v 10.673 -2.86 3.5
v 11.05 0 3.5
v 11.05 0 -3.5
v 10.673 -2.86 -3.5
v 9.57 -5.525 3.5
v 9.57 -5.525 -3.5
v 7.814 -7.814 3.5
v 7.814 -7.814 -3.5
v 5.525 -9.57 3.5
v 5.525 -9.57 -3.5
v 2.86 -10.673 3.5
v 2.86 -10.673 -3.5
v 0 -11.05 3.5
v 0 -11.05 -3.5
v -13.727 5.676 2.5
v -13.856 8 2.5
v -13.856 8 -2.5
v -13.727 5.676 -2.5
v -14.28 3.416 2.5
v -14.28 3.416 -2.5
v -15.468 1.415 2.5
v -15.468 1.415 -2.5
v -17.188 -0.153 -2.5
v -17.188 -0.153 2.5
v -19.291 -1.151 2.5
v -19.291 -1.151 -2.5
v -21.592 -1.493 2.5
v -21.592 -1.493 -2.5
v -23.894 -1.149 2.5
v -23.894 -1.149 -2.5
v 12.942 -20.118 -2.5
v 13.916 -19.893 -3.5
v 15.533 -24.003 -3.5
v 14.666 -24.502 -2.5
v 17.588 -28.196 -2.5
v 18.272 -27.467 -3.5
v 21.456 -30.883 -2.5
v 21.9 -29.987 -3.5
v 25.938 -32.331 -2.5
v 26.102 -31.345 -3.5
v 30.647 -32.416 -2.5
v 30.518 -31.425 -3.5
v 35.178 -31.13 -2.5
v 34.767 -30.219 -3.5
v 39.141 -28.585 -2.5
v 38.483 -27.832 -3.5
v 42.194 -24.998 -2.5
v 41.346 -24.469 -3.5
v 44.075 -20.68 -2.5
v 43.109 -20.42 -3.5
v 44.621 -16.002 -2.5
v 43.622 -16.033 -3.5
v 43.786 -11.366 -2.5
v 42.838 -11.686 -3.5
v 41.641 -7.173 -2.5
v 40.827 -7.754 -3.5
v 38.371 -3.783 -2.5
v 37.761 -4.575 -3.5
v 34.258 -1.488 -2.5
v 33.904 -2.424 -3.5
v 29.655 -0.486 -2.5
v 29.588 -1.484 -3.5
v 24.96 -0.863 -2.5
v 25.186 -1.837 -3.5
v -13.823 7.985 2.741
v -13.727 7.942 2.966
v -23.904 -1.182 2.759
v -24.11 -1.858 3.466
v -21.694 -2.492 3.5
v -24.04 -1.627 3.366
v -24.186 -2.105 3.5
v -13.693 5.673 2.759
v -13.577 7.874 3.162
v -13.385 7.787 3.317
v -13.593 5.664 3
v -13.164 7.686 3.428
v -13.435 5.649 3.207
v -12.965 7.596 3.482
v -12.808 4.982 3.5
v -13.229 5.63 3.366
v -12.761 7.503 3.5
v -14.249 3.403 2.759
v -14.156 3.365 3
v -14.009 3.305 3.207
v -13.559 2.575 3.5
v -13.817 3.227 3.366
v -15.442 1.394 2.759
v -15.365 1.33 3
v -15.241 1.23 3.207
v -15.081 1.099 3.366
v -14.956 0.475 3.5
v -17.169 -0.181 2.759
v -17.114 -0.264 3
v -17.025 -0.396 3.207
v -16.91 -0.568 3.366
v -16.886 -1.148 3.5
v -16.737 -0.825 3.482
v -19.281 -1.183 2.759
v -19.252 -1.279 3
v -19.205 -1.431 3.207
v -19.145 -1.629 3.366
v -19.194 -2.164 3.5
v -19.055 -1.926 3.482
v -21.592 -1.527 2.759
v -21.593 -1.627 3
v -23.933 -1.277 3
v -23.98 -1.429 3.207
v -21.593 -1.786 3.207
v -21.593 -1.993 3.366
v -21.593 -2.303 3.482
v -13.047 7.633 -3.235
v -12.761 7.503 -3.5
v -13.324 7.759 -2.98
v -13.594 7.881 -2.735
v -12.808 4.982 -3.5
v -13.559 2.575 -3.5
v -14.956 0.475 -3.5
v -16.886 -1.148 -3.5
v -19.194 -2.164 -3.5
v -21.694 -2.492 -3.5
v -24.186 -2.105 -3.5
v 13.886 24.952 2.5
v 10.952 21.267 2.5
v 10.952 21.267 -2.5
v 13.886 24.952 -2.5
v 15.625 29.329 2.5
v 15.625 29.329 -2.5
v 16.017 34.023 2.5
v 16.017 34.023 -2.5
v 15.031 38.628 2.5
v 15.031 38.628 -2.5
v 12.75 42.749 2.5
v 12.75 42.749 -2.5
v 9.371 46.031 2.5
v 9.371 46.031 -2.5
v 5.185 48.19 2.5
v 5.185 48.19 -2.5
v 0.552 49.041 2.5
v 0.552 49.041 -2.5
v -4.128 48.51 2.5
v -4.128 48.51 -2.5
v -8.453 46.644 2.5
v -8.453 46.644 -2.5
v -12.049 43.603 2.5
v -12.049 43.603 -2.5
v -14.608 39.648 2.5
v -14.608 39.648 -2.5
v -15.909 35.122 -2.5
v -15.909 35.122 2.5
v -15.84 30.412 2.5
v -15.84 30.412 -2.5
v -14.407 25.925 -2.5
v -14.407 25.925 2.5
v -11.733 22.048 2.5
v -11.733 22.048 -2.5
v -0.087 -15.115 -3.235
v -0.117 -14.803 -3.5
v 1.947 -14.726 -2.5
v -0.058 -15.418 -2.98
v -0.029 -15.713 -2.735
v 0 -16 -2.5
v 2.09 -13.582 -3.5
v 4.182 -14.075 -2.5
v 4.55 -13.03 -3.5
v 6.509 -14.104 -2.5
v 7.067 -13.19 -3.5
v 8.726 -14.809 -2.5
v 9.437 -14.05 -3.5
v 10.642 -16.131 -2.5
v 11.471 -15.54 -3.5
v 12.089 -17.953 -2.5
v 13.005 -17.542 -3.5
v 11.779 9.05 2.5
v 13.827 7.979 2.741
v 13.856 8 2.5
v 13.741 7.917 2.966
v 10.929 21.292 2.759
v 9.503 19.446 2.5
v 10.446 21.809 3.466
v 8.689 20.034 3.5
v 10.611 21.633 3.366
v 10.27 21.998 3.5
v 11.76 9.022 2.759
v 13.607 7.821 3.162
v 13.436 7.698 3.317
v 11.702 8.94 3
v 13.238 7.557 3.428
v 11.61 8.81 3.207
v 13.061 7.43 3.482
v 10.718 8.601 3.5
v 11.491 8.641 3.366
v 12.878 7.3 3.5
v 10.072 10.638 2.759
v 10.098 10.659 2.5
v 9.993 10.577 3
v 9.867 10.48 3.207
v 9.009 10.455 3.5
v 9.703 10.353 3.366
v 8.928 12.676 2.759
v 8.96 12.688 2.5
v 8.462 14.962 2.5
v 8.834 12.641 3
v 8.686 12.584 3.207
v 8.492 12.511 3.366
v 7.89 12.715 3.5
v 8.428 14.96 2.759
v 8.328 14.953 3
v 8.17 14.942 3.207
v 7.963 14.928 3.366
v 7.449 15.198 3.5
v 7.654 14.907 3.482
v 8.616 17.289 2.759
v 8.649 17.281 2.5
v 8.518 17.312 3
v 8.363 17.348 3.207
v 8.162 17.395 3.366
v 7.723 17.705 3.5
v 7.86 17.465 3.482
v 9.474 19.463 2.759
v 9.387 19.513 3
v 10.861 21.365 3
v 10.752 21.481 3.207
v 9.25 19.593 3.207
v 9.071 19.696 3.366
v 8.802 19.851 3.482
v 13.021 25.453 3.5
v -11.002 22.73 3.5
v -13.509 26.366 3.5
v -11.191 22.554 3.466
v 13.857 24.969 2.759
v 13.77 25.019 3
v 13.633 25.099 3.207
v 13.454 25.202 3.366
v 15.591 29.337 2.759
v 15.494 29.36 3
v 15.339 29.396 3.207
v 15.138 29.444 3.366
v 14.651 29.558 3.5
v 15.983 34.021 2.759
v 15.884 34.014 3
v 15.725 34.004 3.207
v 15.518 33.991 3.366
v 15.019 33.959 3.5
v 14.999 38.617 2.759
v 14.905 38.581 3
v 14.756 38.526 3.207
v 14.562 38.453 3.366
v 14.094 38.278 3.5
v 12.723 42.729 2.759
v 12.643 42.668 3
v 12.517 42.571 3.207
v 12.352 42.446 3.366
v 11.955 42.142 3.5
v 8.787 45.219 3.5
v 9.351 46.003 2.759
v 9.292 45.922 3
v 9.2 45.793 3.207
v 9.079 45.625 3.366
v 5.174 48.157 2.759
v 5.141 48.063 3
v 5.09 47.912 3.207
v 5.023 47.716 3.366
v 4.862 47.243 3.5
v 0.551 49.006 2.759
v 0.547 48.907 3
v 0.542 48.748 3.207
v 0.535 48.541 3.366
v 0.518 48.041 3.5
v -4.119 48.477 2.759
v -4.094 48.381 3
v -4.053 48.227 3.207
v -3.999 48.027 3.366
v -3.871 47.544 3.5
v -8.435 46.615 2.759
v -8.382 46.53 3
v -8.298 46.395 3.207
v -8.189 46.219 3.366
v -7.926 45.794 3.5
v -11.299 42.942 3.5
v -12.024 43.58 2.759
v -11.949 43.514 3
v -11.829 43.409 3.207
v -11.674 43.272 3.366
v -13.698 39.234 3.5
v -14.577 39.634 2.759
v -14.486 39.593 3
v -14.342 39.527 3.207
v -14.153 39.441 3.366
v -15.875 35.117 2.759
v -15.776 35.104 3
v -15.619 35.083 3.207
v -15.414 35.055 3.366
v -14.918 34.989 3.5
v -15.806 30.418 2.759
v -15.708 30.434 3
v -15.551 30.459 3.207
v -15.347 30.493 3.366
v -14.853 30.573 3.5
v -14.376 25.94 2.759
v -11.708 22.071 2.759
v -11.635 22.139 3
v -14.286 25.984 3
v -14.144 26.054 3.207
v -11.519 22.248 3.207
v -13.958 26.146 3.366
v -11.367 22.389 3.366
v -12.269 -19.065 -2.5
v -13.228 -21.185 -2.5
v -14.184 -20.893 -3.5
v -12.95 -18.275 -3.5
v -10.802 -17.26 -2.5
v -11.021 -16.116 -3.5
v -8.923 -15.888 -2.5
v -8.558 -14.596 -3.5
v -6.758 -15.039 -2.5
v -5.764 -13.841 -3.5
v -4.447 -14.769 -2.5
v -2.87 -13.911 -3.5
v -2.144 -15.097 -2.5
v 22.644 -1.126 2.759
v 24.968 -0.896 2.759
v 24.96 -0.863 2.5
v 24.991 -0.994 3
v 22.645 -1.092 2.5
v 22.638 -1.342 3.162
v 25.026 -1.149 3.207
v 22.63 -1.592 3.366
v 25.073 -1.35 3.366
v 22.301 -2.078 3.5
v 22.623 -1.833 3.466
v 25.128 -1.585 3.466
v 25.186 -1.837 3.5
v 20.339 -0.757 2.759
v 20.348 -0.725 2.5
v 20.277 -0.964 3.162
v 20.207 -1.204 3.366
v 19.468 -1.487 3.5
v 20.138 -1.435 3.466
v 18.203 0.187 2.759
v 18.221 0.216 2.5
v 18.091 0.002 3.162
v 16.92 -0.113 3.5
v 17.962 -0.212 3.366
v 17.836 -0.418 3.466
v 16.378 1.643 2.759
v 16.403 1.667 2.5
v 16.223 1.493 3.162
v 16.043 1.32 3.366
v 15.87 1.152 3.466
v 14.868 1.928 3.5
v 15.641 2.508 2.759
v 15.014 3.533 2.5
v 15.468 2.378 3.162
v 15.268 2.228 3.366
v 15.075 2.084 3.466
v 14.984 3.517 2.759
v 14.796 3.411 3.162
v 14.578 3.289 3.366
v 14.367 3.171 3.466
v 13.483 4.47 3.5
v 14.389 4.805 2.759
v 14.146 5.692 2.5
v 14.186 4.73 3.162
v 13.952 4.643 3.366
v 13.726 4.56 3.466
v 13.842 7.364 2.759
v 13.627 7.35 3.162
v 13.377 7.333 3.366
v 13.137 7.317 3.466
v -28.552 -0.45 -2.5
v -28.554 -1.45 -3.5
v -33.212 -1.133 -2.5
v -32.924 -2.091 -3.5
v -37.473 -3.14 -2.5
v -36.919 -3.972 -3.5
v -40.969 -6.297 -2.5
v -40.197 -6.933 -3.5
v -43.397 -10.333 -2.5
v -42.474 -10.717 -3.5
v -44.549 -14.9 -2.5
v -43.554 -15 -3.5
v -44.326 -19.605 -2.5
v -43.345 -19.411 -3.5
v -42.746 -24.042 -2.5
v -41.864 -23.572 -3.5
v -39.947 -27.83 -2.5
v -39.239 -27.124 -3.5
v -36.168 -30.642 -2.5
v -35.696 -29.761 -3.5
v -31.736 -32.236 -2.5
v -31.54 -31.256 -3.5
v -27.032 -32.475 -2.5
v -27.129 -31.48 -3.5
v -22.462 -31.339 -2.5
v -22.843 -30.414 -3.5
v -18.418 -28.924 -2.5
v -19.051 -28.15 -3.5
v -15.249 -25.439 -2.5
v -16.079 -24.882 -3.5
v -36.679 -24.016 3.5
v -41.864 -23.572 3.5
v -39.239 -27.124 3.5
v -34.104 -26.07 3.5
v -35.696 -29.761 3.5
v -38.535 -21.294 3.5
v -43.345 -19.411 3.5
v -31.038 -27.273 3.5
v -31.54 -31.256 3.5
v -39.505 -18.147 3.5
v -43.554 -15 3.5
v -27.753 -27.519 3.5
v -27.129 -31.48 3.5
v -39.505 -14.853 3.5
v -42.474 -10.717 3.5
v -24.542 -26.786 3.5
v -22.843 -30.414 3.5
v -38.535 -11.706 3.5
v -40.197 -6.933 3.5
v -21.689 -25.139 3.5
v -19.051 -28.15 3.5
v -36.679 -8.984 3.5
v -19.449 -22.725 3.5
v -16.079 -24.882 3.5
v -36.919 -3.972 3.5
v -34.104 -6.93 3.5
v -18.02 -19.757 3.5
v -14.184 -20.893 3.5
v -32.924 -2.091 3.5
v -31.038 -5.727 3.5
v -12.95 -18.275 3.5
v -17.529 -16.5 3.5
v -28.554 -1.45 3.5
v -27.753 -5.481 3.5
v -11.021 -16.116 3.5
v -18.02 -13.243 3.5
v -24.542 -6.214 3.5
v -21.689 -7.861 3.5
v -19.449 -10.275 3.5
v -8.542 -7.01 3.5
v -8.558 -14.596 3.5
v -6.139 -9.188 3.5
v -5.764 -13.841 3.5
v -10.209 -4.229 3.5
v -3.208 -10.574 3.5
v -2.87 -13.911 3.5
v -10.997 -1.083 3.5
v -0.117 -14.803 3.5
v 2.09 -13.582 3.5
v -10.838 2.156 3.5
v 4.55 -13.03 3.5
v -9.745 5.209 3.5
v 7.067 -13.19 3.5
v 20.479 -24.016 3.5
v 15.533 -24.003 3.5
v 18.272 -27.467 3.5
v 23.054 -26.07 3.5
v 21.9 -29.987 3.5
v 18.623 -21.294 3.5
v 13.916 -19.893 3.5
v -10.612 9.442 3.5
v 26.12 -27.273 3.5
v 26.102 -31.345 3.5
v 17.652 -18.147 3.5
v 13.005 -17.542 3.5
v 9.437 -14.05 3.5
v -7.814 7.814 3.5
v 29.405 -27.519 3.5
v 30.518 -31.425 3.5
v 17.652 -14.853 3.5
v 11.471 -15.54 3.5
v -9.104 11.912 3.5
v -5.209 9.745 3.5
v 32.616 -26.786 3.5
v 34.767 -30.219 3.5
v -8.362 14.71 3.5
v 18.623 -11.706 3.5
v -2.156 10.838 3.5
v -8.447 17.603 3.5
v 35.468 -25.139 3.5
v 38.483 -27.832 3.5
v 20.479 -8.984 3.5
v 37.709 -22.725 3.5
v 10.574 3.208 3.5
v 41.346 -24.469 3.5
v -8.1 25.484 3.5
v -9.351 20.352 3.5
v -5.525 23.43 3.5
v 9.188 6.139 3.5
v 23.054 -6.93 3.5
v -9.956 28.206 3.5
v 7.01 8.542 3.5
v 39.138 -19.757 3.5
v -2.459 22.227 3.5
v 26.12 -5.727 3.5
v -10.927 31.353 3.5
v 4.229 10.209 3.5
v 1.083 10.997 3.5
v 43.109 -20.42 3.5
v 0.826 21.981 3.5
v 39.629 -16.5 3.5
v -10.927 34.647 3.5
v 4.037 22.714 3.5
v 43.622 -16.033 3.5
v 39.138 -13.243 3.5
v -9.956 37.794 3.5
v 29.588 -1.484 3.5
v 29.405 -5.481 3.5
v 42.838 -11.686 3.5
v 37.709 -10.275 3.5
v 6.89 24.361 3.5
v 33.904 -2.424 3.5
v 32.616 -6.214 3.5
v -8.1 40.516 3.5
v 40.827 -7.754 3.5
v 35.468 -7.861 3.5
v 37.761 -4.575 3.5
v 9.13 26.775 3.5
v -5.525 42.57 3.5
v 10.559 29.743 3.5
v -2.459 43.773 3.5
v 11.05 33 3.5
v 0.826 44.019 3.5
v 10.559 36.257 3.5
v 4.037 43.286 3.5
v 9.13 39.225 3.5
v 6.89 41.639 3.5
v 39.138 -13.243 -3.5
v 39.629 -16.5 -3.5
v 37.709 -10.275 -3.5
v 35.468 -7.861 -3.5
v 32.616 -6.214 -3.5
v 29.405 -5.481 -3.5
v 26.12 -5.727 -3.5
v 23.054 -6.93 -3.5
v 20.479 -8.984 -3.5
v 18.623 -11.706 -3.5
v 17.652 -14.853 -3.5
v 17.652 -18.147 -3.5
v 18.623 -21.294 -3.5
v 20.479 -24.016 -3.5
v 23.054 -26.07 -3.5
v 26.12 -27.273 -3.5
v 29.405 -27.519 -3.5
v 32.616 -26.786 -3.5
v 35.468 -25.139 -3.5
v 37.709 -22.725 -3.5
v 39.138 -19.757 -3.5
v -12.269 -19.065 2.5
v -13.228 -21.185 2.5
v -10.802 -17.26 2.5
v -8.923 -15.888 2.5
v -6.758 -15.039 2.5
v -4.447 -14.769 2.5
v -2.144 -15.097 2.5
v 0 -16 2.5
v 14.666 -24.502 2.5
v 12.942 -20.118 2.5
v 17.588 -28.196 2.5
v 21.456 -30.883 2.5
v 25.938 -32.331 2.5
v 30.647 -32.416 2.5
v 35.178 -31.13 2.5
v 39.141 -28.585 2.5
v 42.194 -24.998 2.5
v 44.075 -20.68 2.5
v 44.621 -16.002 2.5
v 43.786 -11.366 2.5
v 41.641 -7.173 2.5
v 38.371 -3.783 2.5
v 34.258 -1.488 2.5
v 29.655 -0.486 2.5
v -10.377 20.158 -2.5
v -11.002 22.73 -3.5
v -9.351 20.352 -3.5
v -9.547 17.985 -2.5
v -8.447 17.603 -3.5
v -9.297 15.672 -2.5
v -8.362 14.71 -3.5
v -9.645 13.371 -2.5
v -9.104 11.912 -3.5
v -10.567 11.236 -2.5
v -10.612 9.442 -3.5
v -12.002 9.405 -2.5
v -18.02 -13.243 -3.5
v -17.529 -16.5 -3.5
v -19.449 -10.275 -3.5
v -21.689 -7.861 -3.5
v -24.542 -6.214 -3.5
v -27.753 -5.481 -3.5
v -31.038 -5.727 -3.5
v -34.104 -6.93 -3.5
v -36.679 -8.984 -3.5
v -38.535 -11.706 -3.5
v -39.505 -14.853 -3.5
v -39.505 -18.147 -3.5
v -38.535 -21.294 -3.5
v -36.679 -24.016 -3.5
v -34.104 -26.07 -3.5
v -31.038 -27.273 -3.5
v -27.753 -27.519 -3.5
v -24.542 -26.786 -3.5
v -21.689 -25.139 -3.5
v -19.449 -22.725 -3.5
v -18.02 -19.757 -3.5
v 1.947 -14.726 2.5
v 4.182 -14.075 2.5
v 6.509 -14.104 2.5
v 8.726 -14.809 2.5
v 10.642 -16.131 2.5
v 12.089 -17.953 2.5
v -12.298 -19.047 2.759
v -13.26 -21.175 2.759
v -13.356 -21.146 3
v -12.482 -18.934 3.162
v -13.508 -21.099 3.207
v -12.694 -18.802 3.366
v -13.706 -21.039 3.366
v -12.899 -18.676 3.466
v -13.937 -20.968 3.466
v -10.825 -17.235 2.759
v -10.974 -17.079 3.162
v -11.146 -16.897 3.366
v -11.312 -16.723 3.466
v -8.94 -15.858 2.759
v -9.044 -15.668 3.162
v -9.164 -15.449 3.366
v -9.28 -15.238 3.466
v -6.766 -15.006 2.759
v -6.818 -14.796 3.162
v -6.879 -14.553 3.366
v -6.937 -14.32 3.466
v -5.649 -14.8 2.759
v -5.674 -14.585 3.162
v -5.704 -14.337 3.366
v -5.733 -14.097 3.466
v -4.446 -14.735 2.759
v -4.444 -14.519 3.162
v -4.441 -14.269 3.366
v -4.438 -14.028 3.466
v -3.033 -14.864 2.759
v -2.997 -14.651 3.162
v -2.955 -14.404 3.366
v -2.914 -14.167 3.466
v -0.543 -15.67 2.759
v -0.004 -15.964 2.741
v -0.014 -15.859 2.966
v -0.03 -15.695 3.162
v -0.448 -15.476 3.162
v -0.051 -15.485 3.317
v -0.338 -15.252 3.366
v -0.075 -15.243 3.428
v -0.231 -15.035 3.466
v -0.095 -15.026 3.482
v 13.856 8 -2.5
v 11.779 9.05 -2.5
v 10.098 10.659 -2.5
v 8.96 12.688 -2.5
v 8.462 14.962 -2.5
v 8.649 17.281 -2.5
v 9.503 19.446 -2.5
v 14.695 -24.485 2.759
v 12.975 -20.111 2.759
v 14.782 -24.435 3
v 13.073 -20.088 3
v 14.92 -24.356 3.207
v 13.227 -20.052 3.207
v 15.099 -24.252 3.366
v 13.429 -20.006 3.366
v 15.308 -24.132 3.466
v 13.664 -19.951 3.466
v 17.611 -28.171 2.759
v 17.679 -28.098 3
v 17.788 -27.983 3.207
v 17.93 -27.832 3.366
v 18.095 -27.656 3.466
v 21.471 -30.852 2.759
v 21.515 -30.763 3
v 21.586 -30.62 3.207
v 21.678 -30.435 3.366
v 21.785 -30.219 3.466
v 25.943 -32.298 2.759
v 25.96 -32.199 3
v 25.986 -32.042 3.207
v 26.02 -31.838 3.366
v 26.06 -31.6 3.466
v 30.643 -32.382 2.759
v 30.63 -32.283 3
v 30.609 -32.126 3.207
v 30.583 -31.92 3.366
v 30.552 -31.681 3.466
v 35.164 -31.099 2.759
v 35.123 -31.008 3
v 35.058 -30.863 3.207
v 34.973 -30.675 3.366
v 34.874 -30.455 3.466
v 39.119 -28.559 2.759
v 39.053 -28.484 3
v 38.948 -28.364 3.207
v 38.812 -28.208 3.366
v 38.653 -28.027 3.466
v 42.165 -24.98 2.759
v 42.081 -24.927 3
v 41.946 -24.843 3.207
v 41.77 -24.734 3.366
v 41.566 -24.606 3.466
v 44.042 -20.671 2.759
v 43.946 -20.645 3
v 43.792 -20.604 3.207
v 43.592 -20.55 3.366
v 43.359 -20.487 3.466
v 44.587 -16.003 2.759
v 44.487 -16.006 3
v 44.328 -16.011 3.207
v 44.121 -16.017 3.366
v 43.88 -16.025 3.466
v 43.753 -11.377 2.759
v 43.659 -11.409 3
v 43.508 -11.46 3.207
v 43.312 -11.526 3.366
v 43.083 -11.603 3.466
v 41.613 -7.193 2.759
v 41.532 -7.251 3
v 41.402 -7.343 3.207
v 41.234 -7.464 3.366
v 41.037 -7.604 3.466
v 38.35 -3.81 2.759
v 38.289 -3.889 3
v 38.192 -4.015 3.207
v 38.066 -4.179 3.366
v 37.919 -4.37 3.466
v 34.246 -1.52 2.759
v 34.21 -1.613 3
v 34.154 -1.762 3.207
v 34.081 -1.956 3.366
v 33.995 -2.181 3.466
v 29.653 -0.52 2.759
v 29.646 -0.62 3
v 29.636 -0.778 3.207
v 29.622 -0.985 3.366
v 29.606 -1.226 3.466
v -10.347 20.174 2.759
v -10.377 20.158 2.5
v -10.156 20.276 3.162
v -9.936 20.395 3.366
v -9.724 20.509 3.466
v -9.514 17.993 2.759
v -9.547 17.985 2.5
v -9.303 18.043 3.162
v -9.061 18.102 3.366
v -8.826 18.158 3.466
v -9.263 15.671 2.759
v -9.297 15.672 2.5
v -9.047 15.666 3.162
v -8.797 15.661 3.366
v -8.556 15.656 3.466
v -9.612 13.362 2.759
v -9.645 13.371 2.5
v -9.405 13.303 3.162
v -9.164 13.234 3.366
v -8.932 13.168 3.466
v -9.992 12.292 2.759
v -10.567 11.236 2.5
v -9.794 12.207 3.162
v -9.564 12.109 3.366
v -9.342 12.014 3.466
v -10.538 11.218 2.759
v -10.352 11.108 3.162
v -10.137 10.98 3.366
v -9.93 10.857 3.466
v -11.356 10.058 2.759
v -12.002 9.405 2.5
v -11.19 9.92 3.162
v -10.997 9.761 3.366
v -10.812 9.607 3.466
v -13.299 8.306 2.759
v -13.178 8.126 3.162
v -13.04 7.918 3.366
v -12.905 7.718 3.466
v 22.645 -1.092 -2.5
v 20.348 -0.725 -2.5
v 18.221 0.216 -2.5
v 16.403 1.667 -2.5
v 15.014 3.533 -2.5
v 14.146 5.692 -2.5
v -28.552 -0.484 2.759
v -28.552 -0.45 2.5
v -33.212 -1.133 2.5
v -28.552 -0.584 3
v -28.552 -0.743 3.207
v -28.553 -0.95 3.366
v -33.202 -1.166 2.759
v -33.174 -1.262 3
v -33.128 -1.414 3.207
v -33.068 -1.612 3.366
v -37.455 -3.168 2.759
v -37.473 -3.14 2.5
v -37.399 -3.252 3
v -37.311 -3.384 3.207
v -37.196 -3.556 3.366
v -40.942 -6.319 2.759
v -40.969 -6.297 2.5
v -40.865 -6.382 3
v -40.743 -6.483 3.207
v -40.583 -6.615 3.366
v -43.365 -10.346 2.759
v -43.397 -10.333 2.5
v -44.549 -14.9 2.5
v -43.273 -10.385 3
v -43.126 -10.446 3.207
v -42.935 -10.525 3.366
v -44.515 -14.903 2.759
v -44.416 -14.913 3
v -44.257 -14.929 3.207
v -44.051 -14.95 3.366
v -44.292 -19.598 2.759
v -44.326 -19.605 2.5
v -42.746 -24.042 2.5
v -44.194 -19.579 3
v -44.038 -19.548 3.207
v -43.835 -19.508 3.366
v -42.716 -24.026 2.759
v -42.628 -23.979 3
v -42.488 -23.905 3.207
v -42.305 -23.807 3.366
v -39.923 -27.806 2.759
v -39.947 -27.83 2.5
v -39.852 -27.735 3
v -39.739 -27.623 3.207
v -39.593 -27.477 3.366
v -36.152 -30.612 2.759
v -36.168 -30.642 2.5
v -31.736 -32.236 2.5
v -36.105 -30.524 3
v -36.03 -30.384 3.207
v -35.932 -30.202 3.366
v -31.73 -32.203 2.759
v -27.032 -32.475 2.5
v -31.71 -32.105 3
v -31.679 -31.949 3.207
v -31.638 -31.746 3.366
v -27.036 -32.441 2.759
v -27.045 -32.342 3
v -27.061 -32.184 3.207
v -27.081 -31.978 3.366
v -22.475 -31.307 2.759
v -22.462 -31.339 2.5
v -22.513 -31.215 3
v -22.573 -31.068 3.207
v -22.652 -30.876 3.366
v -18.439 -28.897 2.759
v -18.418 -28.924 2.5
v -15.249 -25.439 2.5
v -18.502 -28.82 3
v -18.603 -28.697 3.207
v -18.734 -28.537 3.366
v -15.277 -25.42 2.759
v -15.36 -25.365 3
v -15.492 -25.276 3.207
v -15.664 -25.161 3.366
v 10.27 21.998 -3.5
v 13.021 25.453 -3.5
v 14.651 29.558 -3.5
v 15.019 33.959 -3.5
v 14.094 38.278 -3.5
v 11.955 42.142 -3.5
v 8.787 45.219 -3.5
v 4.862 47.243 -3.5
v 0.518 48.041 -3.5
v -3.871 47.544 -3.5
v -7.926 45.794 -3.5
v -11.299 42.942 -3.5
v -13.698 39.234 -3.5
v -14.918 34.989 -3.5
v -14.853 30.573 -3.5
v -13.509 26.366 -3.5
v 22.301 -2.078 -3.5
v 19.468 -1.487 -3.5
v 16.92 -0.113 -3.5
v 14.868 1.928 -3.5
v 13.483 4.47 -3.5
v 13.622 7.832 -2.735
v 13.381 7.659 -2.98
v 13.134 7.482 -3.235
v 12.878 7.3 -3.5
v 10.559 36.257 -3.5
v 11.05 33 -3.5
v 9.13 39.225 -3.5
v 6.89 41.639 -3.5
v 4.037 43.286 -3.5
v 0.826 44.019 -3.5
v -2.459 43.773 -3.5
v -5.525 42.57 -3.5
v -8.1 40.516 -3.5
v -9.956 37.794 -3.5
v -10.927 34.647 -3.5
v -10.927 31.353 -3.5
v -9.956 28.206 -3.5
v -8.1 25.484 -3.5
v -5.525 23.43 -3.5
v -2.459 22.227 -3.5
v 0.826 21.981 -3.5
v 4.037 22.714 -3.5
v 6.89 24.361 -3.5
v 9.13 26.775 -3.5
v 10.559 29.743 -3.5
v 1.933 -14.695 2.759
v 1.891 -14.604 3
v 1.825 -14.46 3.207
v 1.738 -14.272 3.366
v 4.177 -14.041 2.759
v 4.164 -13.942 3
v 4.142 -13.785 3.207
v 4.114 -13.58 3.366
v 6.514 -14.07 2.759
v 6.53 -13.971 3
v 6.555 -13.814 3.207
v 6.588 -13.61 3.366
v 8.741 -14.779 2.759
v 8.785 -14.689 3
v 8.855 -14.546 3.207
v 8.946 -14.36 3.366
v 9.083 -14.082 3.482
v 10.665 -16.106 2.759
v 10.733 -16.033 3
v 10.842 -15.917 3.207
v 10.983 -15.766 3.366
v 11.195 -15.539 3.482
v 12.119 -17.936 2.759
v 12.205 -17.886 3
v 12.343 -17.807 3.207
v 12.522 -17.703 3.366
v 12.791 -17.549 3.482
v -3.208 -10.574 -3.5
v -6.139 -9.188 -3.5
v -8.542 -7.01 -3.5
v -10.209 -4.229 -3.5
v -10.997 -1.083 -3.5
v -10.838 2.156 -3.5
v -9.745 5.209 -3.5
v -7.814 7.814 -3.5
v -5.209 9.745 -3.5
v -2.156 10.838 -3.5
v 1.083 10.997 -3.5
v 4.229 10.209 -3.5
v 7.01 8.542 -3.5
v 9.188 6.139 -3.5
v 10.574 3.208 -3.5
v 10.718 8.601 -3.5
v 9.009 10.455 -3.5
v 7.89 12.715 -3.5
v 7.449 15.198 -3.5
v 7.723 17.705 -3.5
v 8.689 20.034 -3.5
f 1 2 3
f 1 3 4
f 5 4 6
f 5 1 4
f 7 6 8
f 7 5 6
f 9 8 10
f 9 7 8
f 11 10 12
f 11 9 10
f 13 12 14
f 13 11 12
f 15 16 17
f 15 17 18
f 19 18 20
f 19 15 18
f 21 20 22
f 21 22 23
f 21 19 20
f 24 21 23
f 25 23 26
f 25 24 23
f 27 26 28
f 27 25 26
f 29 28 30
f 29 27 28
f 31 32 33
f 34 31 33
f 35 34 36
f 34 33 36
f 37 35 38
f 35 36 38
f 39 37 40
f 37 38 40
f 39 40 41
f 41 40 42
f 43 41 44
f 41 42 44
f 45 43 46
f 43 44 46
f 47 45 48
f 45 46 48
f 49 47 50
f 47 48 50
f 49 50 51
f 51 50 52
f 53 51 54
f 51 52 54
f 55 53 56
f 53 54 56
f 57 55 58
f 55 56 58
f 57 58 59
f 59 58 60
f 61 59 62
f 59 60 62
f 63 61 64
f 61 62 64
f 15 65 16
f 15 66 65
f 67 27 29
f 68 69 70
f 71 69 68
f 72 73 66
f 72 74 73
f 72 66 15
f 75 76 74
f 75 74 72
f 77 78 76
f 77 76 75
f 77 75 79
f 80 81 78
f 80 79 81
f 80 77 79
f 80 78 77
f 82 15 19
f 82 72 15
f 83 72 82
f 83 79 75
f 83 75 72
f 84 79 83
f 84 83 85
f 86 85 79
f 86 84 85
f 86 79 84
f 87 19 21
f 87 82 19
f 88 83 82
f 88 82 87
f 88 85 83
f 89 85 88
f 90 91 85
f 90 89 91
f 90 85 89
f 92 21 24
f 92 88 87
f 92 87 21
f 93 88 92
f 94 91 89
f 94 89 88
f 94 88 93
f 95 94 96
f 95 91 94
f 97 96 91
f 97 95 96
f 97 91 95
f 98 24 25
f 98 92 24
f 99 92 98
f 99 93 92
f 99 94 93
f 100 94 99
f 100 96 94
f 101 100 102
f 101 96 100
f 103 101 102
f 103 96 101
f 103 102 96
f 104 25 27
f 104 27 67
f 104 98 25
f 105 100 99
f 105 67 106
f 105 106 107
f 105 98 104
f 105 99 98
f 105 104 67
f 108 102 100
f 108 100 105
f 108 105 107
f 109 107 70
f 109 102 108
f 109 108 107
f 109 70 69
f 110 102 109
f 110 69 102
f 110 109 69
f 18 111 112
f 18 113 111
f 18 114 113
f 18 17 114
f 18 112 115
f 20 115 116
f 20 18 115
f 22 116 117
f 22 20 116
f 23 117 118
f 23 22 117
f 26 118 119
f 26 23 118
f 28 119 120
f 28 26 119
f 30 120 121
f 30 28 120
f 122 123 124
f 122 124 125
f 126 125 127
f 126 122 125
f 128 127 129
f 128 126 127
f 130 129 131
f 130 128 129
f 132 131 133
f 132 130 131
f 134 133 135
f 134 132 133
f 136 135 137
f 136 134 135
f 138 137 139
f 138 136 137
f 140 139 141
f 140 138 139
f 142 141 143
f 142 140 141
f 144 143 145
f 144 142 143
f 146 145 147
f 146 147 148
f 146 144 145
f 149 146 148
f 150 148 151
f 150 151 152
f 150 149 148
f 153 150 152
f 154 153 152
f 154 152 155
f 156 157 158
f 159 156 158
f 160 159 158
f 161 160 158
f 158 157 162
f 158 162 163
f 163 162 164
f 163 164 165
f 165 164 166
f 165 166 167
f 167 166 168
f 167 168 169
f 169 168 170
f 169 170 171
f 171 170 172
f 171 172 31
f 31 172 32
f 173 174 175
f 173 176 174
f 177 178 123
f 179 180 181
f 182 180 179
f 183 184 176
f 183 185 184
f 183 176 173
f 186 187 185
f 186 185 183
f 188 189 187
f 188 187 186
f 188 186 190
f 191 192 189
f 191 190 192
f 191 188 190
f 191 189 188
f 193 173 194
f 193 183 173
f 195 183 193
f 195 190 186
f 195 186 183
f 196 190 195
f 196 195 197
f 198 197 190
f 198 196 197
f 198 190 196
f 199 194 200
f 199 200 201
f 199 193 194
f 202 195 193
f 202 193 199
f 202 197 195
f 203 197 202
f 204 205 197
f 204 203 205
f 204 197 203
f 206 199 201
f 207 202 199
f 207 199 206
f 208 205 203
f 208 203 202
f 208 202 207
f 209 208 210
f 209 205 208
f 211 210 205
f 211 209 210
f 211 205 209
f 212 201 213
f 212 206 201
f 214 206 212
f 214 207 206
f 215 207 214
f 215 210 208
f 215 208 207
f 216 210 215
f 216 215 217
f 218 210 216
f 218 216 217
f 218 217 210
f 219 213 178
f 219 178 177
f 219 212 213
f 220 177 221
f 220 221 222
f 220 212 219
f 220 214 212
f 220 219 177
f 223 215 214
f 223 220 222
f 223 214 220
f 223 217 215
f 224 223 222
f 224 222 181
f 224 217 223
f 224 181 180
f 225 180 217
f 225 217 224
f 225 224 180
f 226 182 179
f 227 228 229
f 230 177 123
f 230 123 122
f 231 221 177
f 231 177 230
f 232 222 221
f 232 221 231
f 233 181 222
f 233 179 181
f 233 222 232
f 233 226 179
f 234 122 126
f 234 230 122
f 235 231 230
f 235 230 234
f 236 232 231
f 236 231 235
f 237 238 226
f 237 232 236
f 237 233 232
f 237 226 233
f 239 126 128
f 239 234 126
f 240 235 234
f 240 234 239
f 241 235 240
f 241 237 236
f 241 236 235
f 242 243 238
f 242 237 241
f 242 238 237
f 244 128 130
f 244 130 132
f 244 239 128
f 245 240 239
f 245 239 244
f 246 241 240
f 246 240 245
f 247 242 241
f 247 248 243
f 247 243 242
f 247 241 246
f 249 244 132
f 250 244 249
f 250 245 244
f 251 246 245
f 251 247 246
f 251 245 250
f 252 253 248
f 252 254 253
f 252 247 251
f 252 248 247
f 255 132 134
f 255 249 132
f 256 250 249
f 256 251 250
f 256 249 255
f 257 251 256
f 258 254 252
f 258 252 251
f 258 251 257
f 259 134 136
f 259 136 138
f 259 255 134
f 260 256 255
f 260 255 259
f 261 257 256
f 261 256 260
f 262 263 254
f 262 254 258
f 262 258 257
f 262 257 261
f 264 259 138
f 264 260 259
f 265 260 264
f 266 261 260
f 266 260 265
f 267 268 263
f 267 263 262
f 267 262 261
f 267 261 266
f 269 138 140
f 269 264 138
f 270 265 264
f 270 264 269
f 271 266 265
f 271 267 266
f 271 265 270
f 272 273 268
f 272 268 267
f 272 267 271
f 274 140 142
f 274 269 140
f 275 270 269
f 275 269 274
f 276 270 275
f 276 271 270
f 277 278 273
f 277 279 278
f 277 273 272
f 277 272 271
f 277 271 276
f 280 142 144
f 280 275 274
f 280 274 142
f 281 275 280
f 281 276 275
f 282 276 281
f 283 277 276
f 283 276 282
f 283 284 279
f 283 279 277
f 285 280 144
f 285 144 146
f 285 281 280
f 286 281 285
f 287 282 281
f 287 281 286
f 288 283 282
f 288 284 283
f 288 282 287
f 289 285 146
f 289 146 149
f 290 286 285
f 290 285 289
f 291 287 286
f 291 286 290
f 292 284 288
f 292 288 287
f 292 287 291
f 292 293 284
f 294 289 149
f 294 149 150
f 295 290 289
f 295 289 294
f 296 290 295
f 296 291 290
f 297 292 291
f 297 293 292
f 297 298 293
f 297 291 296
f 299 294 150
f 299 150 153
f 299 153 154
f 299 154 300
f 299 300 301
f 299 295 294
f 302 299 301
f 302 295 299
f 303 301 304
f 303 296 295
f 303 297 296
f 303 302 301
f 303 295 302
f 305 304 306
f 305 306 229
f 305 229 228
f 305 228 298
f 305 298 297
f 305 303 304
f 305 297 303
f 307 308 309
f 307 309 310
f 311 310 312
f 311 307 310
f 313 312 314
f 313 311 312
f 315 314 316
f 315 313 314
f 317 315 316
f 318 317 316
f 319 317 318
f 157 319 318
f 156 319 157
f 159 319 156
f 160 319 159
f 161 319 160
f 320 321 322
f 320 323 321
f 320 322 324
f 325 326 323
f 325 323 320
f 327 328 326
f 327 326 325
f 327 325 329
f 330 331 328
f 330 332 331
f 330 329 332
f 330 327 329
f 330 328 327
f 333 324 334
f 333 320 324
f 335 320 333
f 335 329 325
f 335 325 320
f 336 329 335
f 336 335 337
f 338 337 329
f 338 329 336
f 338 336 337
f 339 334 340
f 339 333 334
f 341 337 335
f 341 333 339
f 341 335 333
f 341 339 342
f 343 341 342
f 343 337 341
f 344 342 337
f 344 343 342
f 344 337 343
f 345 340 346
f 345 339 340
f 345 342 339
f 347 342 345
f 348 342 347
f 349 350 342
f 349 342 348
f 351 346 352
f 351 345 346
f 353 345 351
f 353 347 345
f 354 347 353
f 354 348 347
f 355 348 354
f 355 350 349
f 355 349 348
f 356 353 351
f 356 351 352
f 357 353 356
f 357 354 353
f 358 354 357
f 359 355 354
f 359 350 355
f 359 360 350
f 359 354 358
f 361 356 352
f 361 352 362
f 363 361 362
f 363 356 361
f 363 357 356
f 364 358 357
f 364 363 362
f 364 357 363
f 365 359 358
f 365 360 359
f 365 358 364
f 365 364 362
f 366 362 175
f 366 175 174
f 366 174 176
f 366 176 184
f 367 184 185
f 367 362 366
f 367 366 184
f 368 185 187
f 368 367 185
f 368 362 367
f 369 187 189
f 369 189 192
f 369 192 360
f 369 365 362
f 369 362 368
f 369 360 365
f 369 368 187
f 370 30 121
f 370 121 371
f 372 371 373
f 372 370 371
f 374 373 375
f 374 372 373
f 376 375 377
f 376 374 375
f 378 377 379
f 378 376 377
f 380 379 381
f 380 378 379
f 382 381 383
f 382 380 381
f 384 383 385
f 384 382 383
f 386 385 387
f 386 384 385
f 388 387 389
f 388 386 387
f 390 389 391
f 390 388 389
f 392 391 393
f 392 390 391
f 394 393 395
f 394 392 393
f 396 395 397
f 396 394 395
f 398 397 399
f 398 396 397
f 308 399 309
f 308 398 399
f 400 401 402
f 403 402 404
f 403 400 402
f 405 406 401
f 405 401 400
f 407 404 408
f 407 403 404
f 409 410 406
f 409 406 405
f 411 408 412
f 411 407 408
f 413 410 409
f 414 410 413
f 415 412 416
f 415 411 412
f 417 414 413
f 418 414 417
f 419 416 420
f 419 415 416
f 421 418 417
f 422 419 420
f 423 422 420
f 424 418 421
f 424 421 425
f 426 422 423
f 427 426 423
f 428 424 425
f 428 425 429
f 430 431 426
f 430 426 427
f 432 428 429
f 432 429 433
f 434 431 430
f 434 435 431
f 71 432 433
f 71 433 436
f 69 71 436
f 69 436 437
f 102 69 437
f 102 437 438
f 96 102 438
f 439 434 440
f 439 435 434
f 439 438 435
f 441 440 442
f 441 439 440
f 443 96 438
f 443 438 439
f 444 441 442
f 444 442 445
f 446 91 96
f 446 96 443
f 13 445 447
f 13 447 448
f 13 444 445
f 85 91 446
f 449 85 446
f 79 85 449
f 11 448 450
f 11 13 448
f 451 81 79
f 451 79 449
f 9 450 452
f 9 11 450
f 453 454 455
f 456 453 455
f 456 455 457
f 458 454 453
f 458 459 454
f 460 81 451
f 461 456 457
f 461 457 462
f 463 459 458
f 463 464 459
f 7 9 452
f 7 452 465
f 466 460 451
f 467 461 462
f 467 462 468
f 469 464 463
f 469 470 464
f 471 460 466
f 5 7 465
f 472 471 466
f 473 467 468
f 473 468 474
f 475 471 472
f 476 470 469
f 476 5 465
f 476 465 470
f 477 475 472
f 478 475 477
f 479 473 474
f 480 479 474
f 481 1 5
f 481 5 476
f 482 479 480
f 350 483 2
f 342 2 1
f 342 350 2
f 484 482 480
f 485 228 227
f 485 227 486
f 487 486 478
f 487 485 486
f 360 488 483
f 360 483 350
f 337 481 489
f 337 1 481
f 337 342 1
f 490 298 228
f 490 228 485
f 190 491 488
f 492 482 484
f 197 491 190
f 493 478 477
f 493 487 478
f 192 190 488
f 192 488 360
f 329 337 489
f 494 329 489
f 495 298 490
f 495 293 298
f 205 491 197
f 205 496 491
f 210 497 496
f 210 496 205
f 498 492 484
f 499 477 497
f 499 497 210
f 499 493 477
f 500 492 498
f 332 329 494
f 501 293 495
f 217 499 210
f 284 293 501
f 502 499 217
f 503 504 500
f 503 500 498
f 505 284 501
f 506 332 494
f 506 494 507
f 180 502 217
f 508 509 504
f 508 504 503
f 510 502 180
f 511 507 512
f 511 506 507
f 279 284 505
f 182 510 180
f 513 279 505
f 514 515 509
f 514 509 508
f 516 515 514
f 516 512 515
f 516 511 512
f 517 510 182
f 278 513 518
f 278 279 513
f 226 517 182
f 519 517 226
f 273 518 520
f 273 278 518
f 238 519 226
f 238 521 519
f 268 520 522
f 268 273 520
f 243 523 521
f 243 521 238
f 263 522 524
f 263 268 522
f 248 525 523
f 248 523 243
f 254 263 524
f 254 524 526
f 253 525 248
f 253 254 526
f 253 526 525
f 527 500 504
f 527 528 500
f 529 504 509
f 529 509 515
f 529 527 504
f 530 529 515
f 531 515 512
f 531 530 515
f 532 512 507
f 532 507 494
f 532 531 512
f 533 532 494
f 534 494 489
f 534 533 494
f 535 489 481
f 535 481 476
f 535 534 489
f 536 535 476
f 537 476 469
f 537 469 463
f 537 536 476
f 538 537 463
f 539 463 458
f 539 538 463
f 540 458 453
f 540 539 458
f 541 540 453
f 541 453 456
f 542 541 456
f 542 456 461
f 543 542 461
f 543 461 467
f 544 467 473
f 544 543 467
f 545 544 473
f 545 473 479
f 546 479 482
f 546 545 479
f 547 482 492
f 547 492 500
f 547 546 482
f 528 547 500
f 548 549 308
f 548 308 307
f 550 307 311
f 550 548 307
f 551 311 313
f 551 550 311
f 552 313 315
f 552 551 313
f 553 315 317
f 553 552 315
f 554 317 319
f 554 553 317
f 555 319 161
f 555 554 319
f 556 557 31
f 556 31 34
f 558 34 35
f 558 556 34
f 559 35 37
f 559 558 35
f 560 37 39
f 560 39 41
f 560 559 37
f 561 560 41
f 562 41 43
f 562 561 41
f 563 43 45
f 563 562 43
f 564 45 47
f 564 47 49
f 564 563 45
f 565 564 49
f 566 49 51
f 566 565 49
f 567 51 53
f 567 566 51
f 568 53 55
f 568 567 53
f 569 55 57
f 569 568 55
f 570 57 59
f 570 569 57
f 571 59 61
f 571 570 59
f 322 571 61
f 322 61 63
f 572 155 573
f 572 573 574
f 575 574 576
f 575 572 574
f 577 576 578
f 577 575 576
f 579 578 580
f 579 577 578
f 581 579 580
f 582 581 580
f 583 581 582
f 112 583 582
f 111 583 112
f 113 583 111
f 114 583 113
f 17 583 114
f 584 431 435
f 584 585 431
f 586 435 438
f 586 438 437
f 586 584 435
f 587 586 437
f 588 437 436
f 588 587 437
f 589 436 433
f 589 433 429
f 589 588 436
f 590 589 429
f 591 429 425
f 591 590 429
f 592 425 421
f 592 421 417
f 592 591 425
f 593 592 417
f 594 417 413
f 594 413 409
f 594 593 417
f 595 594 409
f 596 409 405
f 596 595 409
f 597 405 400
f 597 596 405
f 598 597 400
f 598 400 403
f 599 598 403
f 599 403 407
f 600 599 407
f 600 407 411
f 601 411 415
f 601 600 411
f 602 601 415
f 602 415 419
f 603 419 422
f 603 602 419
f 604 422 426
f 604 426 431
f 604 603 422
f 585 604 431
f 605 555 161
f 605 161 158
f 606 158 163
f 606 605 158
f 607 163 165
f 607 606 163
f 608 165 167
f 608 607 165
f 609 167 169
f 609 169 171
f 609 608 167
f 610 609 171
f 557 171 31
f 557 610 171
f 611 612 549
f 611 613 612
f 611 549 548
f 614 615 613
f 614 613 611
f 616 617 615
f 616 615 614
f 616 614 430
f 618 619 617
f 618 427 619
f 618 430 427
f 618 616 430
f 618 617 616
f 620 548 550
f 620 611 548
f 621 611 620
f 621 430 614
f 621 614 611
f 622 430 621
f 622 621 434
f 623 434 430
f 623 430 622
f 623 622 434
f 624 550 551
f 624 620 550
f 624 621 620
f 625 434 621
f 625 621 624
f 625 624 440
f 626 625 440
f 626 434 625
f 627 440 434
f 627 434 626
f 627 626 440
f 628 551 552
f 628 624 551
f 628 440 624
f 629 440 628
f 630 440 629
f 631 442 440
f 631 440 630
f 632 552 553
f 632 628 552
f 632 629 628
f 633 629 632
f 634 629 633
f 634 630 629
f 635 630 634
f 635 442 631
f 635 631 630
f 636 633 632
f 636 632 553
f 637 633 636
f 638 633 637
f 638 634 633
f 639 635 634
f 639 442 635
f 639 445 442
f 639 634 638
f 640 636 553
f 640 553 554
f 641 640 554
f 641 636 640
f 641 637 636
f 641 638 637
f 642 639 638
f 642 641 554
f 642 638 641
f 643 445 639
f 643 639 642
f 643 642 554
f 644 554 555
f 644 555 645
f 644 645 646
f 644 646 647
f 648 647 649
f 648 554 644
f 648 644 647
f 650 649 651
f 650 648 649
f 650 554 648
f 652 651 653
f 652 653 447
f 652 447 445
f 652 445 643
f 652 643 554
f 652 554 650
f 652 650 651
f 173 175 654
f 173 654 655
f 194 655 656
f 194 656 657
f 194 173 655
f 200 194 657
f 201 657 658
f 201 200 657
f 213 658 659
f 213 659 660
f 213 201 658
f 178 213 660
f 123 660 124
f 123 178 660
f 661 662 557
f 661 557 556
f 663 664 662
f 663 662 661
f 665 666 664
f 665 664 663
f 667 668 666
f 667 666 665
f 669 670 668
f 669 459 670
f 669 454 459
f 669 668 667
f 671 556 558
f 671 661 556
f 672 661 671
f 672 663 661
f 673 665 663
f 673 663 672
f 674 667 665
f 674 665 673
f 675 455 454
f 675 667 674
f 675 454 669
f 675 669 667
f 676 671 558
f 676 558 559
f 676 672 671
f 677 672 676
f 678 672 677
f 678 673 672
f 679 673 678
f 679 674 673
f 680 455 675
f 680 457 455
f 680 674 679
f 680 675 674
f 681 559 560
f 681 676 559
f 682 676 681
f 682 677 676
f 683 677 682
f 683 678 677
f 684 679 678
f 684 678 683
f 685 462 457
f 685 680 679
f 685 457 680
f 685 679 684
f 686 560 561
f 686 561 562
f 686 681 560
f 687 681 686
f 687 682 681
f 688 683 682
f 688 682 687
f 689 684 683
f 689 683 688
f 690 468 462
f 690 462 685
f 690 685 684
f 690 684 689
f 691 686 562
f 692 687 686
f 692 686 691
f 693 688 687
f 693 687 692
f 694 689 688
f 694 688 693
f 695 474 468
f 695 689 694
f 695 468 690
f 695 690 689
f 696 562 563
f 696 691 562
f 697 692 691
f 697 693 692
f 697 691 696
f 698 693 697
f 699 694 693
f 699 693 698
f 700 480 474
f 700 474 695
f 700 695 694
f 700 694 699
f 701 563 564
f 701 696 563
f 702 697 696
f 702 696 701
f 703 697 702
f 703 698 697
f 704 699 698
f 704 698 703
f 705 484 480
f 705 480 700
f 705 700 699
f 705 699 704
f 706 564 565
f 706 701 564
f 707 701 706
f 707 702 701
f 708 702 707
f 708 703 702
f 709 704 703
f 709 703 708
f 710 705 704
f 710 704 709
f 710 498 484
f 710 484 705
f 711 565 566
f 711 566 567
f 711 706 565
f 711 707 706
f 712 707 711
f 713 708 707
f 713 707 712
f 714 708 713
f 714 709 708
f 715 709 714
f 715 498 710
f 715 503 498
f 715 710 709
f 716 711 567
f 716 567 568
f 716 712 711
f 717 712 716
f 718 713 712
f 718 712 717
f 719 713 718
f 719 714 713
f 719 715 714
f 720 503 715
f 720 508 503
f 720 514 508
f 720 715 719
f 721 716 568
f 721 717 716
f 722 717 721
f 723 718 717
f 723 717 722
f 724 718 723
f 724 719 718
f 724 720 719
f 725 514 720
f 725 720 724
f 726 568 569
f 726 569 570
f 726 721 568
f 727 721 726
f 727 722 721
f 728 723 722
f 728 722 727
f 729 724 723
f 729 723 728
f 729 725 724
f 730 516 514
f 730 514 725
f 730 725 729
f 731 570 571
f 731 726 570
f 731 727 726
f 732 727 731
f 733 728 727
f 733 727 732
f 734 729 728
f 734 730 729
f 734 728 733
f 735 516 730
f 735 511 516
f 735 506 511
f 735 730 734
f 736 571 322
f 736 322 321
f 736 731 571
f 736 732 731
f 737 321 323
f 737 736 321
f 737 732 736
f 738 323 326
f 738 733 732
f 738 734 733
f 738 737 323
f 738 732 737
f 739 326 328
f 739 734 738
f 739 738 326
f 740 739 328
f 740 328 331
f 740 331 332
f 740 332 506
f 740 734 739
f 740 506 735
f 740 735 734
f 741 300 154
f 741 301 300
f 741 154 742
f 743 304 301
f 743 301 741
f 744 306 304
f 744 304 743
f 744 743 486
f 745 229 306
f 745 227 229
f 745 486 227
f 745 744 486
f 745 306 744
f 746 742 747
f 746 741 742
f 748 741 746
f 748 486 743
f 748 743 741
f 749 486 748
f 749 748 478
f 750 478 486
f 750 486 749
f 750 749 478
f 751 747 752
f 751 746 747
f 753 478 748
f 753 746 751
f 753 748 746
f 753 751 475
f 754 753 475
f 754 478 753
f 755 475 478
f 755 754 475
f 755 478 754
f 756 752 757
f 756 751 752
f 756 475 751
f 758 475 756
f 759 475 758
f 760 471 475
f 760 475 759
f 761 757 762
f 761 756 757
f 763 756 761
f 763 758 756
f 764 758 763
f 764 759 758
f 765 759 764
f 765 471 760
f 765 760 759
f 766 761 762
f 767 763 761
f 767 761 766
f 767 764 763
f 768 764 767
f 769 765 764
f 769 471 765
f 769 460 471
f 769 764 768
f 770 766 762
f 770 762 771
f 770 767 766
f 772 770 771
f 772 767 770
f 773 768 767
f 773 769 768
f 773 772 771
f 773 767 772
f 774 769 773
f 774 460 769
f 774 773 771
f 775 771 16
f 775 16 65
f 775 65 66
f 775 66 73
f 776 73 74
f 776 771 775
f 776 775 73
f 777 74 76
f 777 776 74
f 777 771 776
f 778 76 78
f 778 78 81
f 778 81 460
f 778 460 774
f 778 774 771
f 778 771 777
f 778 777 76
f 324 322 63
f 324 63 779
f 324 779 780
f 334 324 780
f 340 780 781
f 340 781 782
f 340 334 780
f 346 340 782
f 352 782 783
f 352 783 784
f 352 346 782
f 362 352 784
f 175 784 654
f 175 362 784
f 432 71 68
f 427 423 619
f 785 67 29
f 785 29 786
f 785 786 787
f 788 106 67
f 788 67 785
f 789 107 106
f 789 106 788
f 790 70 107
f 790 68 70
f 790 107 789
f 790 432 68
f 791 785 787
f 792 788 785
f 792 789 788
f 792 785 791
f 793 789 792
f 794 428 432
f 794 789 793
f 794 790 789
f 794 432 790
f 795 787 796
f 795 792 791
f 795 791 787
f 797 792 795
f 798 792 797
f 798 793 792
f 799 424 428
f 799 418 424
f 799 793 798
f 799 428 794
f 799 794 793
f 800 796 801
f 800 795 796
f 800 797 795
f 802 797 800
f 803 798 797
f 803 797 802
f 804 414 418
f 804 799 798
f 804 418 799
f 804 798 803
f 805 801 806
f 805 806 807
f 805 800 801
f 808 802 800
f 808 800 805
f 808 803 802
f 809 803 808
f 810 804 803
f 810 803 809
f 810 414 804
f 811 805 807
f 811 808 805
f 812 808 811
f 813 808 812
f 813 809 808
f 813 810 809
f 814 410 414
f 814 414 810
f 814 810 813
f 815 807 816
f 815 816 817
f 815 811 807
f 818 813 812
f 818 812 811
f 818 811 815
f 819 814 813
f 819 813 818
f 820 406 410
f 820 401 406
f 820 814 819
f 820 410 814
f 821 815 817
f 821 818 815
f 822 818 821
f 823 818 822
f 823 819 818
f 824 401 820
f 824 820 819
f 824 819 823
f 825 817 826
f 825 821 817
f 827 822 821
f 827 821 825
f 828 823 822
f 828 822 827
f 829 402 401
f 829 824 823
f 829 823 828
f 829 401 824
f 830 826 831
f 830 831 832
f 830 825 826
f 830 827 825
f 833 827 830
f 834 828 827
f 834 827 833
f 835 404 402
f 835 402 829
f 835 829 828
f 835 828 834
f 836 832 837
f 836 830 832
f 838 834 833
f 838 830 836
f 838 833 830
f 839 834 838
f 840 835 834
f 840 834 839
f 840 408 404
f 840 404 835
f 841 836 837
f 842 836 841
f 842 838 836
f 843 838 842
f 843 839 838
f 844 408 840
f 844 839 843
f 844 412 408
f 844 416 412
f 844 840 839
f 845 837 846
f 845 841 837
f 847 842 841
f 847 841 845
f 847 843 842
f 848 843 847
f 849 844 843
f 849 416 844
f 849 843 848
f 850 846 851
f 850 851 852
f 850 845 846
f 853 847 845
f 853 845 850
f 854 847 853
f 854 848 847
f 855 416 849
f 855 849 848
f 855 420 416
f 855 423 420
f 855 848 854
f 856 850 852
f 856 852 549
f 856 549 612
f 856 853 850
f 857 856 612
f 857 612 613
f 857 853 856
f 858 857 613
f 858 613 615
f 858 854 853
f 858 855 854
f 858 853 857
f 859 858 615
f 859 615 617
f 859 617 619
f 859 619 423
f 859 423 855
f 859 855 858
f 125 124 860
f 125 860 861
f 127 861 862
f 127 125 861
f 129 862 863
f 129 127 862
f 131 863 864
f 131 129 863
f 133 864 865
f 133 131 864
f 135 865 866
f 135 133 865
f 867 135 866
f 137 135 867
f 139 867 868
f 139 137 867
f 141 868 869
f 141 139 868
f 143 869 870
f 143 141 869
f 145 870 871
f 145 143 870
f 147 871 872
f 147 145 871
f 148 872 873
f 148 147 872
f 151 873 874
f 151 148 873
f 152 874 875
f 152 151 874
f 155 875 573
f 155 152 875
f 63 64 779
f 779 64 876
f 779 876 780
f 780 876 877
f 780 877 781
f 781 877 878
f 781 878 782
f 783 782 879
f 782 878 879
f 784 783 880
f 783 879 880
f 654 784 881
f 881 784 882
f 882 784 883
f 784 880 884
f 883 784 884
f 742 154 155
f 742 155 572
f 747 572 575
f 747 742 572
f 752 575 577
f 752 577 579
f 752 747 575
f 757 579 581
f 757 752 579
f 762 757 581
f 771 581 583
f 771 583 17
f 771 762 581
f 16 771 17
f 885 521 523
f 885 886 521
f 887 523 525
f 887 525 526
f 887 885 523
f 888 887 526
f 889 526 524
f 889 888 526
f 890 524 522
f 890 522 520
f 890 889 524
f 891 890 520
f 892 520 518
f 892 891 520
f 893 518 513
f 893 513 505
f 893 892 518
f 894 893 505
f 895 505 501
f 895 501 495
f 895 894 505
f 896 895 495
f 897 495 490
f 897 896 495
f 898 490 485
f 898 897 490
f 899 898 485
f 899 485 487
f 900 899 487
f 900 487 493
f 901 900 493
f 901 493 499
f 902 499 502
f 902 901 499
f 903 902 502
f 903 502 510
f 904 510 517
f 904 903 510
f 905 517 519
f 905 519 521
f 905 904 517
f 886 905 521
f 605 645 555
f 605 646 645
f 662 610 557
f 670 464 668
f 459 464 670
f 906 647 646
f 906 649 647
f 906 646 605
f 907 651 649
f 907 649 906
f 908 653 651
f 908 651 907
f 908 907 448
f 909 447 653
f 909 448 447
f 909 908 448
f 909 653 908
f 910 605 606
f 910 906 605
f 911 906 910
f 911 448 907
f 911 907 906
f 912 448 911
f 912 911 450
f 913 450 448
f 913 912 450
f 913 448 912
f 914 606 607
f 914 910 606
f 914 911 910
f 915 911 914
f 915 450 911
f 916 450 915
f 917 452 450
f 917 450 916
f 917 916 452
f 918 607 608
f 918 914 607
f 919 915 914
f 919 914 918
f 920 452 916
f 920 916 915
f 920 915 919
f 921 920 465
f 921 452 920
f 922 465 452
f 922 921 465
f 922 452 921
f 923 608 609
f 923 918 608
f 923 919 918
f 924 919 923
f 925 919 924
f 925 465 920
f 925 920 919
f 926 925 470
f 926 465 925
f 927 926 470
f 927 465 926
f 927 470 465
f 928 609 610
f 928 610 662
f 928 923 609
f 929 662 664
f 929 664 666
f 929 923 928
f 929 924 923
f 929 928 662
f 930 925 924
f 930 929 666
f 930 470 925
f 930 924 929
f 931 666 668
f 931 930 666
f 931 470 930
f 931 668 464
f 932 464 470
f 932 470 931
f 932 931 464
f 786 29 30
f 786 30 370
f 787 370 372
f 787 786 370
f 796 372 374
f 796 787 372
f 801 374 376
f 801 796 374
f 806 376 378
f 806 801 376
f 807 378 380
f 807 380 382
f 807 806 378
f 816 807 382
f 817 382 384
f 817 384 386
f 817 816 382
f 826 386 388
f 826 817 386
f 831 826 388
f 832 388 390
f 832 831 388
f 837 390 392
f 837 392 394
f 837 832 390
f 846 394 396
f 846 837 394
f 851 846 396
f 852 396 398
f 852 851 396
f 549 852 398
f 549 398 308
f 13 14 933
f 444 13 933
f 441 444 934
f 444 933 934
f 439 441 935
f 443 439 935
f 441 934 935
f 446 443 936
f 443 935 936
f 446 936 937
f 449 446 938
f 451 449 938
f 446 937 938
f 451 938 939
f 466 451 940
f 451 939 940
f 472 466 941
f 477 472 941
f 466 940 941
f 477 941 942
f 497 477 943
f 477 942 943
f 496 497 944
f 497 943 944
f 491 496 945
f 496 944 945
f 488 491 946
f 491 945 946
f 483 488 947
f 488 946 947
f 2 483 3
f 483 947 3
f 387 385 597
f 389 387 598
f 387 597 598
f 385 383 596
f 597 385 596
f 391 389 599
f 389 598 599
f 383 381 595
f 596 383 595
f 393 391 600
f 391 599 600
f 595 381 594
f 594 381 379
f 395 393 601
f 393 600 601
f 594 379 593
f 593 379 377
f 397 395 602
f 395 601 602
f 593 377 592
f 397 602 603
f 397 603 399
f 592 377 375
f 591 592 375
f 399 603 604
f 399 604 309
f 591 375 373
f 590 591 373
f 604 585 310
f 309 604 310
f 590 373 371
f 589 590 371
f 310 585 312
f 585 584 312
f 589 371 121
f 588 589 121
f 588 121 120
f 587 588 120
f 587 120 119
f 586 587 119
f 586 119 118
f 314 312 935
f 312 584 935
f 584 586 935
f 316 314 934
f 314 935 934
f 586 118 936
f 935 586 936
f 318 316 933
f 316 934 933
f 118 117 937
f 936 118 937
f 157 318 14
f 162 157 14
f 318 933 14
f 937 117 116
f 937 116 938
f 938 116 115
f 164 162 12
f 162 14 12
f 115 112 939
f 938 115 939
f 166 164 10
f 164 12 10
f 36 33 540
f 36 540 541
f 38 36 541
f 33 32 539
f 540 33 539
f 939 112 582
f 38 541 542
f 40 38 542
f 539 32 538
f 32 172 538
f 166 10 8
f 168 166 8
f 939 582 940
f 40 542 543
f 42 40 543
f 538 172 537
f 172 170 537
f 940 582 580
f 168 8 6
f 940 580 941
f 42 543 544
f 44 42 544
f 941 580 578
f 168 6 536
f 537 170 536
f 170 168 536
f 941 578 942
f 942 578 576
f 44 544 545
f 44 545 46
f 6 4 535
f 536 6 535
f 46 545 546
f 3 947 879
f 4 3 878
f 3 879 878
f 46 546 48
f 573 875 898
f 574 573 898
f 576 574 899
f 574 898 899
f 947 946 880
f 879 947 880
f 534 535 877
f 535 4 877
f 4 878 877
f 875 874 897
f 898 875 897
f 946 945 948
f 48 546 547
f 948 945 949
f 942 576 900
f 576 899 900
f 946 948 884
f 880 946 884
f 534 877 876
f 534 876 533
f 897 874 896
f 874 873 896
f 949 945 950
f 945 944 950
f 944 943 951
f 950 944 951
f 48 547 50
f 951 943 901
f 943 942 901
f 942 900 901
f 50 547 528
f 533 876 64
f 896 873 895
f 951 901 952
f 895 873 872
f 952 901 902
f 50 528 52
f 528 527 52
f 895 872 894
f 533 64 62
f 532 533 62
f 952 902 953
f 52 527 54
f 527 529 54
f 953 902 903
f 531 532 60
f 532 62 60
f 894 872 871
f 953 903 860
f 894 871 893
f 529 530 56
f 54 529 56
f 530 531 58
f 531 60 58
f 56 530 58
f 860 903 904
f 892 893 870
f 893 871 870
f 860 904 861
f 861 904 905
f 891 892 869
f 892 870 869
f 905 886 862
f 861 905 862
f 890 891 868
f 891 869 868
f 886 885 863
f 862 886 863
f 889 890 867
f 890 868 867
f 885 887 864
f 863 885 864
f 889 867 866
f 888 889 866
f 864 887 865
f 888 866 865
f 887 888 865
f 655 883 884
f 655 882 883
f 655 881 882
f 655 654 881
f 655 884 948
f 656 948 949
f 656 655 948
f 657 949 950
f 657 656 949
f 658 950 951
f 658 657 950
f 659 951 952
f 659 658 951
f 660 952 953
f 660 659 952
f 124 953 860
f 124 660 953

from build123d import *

# Parameters (mm, degrees)
F0_R     = 11.05
F1_DEPTH = 3.5
F2_R     = 1
F3_SIZE  = 1


with BuildPart() as f1:
    # F0 (on Top) → F1 (new body, symmetric)
    with BuildSketch(Plane.XY):
        with BuildLine():
            ThreePointArc((-13.227763, -21.18476), (-7.86781, -15.393259), (0, -16))
            ThreePointArc((0, -16), (7.643636, -14.374283), (12.942037, -20.118417))
            ThreePointArc((12.942037, -20.118417), (42.194334, -24.998281), (24.960422, -0.863198))
            ThreePointArc((24.960422, -0.863198), (17.264859, 0.882906), (13.856406, 8))
            ThreePointArc((13.856406, 8), (8.626677, 13.806724), (10.952041, 21.267341))
            ThreePointArc((10.952041, 21.267341), (0.55198, 49.040506), (-11.732659, 22.047959))
            ThreePointArc((-11.732659, 22.047959), (-9.397048, 14.510353), (-13.856406, 8))
            ThreePointArc((-13.856406, 8), (-16.270312, 0.567559), (-23.894078, -1.148924))
            ThreePointArc((-23.894078, -1.148924), (-42.746314, -24.042224), (-13.227763, -21.18476))
        make_face()
        with Locations((-28.578838, -16.5)):
            Circle(F0_R, mode=Mode.SUBTRACT)
        with Locations((28.578838, -16.5)):
            Circle(F0_R, mode=Mode.SUBTRACT)
        with BuildLine():
            ThreePointArc((0, -11.05), (-7.81353, 7.81353), (11.05, 0))
            ThreePointArc((11.05, 0), (7.81353, -7.81353), (0, -11.05))
        make_face(mode=Mode.SUBTRACT)
        with Locations((0, 33)):
            Circle(F0_R, mode=Mode.SUBTRACT)
    extrude(amount=F1_DEPTH, both=True)

    # F2
    f2_edges = [f1.edges().sort_by_distance(p)[0] for p in [
        (0.55198, 49.040506, 3.5),
        (42.194334, -24.998281, 3.5),
        (17.264859, 0.882906, 3.5),
        (8.626677, 13.806724, 3.5),
        (-9.397048, 14.510353, 3.5),
        (-16.270312, 0.567559, 3.5),
        (-42.746314, -24.042224, 3.5),
        (-7.86781, -15.393259, 3.5),
        (7.643636, -14.374283, 3.5),
    ]]
    fillet(f2_edges, radius=F2_R)

    # F3
    f3_edges = [f1.edges().sort_by_distance(p)[0] for p in [
        (0.55198, 49.040506, -3.5),
        (-9.397048, 14.510353, -3.5),
        (-16.270312, 0.567559, -3.5),
        (-42.746314, -24.042224, -3.5),
        (-7.86781, -15.393259, -3.5),
        (7.643636, -14.374283, -3.5),
        (42.194334, -24.998281, -3.5),
        (17.264859, 0.882906, -3.5),
        (8.626677, 13.806724, -3.5),
    ]]
    chamfer(f3_edges, length=F3_SIZE)


solid = f1.part
